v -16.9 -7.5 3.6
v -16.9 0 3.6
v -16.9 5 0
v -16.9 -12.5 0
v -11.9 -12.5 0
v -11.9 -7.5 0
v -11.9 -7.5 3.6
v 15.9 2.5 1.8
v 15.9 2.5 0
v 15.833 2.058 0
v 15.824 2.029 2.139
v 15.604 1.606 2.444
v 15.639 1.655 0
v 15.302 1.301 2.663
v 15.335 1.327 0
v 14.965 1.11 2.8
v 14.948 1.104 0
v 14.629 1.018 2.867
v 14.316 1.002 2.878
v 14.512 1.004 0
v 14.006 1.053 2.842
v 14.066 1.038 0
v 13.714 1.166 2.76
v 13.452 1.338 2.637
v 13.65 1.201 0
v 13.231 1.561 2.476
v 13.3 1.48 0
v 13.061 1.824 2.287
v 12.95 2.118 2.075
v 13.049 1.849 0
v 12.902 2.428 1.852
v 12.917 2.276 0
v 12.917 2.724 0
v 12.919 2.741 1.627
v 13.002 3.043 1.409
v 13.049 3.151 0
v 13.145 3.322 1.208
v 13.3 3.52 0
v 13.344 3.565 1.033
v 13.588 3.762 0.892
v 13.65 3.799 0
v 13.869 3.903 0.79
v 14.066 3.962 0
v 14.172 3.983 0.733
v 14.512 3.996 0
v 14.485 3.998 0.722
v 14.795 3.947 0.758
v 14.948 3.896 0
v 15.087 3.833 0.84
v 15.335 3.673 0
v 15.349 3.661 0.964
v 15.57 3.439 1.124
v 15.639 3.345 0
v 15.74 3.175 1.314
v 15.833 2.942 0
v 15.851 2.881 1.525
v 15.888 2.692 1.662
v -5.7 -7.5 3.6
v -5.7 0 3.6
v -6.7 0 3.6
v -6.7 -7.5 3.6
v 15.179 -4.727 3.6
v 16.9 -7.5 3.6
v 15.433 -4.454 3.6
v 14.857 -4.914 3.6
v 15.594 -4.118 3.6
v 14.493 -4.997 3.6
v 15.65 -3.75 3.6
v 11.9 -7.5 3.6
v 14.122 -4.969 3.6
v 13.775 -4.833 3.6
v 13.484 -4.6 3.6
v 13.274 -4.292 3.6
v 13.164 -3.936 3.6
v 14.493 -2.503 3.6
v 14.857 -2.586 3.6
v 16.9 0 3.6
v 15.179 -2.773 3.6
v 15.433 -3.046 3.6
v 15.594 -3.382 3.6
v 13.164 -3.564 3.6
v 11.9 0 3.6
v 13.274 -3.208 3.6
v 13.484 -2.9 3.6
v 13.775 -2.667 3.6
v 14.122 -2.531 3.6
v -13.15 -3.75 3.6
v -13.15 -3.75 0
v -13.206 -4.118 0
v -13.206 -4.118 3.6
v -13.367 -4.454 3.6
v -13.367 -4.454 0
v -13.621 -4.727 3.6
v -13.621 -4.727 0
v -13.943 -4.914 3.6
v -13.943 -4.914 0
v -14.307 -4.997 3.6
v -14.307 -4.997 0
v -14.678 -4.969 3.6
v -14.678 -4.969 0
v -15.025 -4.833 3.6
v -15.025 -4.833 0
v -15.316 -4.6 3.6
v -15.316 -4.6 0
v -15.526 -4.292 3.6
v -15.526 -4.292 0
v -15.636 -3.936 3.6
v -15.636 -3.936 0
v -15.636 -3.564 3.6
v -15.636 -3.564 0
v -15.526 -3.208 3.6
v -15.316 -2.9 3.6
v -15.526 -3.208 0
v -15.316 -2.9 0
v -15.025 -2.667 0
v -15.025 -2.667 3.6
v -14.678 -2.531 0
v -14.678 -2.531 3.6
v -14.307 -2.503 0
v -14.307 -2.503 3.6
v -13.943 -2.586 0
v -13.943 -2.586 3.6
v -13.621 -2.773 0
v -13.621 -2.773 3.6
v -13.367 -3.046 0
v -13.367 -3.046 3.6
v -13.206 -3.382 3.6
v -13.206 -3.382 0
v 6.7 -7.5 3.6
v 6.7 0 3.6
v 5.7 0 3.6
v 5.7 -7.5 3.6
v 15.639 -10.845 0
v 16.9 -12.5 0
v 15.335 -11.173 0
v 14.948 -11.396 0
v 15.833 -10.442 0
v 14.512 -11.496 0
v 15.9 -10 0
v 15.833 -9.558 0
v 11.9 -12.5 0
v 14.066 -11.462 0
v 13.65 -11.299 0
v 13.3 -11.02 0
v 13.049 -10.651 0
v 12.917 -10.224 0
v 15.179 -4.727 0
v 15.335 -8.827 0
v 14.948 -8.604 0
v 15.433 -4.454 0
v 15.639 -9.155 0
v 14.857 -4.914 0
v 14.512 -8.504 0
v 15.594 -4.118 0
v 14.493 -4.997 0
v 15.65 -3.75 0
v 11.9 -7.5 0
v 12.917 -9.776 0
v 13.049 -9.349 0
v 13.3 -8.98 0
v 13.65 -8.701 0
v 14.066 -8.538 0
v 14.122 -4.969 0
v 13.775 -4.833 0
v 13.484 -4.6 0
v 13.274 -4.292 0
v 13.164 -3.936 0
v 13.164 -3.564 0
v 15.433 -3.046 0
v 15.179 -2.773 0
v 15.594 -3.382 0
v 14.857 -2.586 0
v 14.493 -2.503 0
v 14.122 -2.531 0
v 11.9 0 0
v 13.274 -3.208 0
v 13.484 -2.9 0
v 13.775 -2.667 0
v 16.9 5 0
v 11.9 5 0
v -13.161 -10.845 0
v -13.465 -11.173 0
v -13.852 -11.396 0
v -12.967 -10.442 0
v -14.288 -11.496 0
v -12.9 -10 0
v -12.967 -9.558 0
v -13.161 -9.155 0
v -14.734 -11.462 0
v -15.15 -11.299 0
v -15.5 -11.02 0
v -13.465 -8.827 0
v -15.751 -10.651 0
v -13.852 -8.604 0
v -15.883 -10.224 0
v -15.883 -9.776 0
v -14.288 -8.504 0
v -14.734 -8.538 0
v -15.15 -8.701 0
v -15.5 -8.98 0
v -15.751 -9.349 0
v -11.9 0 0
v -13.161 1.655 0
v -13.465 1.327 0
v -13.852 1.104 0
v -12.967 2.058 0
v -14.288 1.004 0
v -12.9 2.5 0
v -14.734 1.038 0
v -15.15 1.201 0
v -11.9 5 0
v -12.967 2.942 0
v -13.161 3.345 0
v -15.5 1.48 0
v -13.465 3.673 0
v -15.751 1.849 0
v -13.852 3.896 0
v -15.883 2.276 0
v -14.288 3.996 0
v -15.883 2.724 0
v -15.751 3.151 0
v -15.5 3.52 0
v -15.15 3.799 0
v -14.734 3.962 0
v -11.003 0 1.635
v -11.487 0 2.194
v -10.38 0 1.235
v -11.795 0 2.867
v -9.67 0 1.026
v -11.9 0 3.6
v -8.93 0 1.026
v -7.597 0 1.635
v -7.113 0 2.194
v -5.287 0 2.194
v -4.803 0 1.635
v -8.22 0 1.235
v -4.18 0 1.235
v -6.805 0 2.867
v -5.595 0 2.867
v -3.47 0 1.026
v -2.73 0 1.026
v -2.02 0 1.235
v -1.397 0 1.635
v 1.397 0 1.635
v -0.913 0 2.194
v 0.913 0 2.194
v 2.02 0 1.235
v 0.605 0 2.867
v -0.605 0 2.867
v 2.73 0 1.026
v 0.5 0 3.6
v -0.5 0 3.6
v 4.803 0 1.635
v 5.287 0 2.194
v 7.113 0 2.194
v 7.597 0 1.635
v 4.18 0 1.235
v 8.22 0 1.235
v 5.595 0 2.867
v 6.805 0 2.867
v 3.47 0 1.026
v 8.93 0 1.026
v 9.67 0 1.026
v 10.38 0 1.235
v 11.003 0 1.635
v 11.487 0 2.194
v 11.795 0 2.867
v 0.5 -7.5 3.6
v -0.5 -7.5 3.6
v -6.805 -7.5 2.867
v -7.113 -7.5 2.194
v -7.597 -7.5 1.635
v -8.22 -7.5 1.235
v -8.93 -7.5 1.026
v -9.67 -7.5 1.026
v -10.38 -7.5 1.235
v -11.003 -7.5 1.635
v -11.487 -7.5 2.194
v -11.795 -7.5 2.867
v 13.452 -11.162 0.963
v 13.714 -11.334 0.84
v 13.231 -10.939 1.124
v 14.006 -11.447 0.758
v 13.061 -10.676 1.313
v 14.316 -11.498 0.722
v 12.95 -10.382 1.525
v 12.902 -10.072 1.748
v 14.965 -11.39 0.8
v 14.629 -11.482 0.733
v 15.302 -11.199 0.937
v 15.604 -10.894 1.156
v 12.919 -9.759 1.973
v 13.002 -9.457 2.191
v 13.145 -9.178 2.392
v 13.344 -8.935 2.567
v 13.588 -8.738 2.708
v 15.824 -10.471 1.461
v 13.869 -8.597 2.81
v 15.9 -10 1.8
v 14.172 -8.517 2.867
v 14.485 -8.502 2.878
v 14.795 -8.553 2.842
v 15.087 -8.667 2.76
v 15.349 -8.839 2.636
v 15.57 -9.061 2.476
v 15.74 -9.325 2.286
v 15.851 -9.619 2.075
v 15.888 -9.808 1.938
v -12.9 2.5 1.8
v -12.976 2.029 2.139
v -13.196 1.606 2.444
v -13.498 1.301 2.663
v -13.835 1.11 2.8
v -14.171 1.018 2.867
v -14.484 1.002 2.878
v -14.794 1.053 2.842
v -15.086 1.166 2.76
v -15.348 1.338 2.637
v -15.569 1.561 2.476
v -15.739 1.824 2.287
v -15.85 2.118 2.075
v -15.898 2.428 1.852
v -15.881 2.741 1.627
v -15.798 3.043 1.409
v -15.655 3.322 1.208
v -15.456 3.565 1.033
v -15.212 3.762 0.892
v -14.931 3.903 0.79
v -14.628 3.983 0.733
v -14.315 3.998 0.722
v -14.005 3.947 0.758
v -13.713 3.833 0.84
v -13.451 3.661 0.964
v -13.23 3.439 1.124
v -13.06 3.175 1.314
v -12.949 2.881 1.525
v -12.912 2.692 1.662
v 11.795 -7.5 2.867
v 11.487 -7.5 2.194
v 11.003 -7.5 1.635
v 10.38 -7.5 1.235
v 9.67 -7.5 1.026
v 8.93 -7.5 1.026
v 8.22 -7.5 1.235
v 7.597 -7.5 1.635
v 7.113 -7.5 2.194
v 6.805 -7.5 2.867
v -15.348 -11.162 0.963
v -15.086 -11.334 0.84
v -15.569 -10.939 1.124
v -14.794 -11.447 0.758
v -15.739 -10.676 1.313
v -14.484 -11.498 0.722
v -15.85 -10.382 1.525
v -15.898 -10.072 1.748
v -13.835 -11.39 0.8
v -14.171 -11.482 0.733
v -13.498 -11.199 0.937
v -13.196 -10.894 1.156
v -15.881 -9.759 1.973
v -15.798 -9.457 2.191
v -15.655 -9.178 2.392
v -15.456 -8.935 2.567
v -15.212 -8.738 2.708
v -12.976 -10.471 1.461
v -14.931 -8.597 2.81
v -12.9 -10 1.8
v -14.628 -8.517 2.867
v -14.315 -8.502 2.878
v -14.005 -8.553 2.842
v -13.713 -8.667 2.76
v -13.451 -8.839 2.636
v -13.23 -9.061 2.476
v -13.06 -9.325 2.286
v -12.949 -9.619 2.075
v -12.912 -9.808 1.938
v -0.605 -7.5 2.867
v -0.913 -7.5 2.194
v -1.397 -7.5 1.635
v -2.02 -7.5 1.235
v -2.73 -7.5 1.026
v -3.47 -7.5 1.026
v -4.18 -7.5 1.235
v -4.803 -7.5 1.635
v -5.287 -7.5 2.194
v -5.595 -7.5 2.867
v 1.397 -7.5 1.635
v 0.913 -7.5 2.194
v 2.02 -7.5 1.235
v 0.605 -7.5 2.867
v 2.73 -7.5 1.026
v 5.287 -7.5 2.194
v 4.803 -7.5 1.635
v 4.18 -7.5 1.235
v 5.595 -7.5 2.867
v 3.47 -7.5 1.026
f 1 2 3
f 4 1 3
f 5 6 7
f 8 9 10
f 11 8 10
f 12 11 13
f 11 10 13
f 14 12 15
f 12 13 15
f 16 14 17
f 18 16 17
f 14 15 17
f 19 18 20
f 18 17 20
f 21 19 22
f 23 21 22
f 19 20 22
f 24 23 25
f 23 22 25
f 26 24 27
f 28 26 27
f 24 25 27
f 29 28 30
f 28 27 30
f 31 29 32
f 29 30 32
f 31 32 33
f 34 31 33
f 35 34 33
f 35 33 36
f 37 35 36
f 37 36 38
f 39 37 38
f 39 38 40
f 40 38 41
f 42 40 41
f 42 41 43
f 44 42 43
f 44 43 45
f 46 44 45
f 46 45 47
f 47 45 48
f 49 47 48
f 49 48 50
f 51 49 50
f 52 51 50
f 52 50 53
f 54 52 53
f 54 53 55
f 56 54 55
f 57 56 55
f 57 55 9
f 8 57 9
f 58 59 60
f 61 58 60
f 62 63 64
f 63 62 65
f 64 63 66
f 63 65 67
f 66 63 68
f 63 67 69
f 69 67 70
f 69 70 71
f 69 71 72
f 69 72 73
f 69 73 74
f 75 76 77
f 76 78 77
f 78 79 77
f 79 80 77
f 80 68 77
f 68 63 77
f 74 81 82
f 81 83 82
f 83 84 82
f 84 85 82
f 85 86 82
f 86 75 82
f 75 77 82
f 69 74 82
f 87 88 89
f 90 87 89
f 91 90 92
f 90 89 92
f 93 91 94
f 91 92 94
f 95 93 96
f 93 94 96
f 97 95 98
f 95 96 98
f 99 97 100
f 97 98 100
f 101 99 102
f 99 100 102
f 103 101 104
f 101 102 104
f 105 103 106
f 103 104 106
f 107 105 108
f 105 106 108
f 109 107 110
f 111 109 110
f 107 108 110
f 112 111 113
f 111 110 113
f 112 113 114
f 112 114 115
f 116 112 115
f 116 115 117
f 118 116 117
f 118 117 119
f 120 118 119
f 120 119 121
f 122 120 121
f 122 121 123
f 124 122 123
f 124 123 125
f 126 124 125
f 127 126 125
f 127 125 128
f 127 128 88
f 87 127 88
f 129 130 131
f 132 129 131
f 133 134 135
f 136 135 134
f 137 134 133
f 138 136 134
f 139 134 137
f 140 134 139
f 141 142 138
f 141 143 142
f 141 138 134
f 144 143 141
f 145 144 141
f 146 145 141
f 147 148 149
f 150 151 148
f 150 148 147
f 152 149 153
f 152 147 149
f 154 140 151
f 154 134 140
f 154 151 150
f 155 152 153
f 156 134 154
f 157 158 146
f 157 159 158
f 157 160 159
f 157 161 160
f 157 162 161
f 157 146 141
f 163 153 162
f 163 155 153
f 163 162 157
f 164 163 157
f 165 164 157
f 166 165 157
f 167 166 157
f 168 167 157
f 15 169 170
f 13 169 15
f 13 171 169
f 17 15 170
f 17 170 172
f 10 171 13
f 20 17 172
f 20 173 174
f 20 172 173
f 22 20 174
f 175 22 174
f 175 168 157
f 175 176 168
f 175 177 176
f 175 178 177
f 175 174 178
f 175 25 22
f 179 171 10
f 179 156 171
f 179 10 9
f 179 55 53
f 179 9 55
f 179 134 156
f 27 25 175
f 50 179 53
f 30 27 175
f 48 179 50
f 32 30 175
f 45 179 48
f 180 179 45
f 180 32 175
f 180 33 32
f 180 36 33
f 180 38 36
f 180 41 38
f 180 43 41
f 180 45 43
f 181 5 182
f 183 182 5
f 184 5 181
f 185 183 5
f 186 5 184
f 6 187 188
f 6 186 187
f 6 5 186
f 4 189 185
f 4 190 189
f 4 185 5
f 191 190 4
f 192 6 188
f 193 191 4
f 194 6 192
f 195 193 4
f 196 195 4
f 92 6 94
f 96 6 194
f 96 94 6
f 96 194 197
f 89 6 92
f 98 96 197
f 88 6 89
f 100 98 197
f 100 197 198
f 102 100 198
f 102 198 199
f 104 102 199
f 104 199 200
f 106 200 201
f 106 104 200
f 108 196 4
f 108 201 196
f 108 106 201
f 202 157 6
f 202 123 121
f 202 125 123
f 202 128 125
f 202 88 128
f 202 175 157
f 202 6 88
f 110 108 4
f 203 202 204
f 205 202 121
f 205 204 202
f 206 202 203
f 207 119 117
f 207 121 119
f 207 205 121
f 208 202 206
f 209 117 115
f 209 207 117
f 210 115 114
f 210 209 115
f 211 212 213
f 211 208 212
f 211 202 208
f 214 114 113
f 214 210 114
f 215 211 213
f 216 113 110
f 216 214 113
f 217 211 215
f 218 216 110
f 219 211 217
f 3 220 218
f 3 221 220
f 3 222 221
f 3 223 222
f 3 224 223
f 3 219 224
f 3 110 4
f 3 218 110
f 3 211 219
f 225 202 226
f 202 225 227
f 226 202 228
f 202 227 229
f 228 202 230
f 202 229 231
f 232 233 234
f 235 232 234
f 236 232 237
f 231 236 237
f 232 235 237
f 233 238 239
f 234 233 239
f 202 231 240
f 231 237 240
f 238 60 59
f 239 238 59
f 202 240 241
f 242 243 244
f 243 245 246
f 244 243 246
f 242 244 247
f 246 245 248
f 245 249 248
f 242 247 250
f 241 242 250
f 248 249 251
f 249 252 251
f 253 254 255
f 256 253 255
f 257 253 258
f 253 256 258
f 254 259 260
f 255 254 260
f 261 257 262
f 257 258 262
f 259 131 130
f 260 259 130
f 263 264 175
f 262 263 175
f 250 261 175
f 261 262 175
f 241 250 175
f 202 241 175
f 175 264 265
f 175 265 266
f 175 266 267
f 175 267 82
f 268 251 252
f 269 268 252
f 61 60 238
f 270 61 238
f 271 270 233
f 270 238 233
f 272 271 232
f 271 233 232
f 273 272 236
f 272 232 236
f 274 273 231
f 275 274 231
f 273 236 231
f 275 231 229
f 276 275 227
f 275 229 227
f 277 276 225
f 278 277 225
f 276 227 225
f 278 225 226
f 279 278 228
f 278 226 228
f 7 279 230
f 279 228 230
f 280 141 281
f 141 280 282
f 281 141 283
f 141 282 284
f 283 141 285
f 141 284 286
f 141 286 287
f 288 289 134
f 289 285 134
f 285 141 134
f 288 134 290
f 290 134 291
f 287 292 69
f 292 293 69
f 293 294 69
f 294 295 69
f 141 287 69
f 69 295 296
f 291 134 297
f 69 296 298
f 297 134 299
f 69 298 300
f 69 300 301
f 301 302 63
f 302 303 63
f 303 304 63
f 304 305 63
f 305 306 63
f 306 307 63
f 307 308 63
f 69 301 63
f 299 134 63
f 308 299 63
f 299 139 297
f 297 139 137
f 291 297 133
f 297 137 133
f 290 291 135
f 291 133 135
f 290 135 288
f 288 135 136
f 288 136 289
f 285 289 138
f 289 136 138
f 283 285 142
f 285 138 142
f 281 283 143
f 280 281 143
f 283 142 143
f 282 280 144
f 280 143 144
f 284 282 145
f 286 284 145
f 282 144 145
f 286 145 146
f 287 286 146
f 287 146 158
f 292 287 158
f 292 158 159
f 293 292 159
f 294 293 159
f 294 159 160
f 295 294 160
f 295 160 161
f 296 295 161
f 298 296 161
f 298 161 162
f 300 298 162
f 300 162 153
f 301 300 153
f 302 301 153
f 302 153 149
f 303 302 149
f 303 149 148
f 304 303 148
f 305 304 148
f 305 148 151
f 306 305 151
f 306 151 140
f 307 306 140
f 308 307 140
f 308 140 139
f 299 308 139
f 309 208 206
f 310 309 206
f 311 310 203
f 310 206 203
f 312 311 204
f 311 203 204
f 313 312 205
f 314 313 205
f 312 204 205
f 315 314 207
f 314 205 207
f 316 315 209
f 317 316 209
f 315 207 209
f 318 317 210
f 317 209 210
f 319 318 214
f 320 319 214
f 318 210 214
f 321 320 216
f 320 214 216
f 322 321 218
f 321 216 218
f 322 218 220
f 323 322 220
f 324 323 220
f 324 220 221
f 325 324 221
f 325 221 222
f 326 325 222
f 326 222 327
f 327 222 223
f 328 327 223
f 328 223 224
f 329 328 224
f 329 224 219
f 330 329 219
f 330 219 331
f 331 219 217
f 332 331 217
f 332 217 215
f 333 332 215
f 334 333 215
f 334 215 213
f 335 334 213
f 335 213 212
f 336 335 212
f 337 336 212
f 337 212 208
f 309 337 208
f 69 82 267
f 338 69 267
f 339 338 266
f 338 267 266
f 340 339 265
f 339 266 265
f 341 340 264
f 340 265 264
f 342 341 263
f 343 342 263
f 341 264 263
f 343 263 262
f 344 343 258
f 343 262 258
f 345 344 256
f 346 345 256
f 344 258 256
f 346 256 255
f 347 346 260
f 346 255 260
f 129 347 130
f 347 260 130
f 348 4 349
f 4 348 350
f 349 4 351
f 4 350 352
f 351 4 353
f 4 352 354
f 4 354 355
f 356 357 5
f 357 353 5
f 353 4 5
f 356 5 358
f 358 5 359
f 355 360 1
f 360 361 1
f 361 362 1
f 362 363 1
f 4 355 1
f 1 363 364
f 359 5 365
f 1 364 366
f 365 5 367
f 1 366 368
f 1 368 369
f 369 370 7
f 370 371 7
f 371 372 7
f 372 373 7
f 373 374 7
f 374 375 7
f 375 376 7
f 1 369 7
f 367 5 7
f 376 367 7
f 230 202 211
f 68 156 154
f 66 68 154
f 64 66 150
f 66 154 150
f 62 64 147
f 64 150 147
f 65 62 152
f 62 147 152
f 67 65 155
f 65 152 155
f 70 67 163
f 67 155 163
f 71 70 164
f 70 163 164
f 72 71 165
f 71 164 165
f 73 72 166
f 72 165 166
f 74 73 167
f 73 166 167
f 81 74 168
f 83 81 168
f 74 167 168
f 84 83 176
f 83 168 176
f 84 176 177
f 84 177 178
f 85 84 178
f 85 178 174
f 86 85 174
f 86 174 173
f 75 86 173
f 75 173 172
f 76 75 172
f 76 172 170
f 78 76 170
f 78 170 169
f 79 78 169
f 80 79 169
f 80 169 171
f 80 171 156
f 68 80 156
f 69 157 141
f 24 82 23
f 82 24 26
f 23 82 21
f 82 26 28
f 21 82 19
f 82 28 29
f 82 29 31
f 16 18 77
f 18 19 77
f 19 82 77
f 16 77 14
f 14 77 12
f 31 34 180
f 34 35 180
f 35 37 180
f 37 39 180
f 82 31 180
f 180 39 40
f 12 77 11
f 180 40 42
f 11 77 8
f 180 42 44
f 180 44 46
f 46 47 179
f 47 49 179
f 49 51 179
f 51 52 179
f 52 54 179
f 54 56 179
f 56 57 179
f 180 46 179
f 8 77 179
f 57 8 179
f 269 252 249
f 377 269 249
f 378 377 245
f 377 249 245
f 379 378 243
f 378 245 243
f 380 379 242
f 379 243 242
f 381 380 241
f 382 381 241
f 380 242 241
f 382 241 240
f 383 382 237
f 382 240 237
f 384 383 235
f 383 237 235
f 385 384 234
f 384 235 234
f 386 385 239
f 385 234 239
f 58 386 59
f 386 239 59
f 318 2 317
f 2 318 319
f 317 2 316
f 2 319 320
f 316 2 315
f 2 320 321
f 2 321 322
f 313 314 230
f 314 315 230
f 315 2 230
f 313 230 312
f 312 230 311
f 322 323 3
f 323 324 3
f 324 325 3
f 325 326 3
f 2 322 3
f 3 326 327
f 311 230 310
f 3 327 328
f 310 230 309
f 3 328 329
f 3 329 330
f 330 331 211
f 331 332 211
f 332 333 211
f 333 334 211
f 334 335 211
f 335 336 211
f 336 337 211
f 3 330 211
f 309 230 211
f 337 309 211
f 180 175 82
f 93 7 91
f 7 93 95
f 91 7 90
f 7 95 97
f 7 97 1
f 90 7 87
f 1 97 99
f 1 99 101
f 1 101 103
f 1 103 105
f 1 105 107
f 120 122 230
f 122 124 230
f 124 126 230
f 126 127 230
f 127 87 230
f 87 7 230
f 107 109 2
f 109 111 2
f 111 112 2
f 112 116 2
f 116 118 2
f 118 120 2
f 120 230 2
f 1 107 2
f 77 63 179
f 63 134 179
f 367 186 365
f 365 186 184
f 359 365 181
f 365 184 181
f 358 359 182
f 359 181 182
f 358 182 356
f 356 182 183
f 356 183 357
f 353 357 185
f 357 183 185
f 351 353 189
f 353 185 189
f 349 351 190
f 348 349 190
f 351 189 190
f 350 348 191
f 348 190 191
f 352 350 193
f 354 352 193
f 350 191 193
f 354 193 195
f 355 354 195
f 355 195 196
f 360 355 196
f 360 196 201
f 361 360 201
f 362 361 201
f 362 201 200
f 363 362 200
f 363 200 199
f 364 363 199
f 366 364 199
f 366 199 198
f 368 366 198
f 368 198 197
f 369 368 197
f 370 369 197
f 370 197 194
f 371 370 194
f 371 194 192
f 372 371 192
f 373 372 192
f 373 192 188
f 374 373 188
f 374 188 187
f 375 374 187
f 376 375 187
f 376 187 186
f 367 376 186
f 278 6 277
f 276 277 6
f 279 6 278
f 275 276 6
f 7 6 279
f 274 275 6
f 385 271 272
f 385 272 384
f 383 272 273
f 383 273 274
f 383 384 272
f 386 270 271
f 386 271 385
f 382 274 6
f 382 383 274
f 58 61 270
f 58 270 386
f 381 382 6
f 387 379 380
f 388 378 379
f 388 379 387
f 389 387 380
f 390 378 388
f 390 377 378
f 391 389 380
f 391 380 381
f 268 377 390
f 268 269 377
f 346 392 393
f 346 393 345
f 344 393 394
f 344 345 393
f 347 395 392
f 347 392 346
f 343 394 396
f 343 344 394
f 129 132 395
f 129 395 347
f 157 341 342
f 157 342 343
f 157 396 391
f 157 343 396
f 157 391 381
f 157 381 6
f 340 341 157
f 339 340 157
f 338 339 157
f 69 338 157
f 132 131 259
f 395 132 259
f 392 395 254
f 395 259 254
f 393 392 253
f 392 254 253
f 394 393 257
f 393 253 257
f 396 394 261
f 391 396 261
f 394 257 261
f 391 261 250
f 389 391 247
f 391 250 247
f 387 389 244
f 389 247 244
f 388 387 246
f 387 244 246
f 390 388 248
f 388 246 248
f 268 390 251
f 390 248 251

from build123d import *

# Parameters (mm, degrees)
F1_DEPTH      = 7.5
F2_W          = 5
F2_H          = 3.6
F3_DEPTH      = 5
F3_DEPTH_BACK = 12.5
F5_DEPTH      = 35.2
F6_R          = 1.5
F6_R_2        = 1.25
F7_DEPTH      = 25


with BuildPart() as f1:
    # F0 (on Front) → F1 (new body)
    with BuildSketch(Plane.XZ):
        with BuildLine():
            Line((16.9, 3.6), (11.9, 3.6))
            ThreePointArc((11.9, 3.6), (9.3, 1), (6.7, 3.6))
            Line((6.7, 3.6), (5.7, 3.6))
            ThreePointArc((5.7, 3.6), (3.1, 1), (0.5, 3.6))
            Line((0.5, 3.6), (-0.5, 3.6))
            ThreePointArc((-0.5, 3.6), (-3.1, 1), (-5.7, 3.6))
            Line((-5.7, 3.6), (-6.7, 3.6))
            ThreePointArc((-6.7, 3.6), (-9.3, 1), (-11.9, 3.6))
            Line((-11.9, 3.6), (-16.9, 3.6))
            Line((-16.9, 3.6), (-16.9, 0))
            Line((-16.9, 0), (16.9, 0))
            Line((16.9, 0), (16.9, 3.6))
        make_face()
    extrude(amount=F1_DEPTH)

    # F2 (on face) → F3 (join, two sides)
    with BuildSketch(Plane(origin=(0, 0, 0), x_dir=(-1, 0, 0), z_dir=(0, 1, 0))) as f3_sk:
        with Locations((-14.4, 1.8)):
            Rectangle(F2_W, F2_H)
        with Locations((14.4, 1.8)):
            Rectangle(F2_W, F2_H)
    extrude(amount=F3_DEPTH)
    extrude(f3_sk.sketch, amount=-F3_DEPTH_BACK)

    # F4 (on face) → F5 (cut)
    with BuildSketch(Plane.YZ.offset(16.9)):
        Polygon((-7.5, 3.6), (-12.5, 3.6), (-12.5, 0), align=None)
        Polygon((5, 0), (5, 3.6), (0, 3.6), align=None)
    extrude(amount=-F5_DEPTH, mode=Mode.SUBTRACT)

    # F6 (on face) → F7 (cut)
    with BuildSketch(Plane(origin=(0, 0, 0), x_dir=(1, 0, 0), z_dir=(0, 0, -1))):
        with Locations((14.4, 10)):
            Circle(F6_R)
        with Locations((14.4, 3.75)):
            Circle(F6_R_2)
        with Locations((14.4, -2.5)):
            Circle(F6_R)
        with Locations((-14.4, -2.5)):
            Circle(F6_R)
        with Locations((-14.4, 10)):
            Circle(F6_R)
        with Locations((-14.4, 3.75)):
            Circle(F6_R_2)
    extrude(amount=-F7_DEPTH, mode=Mode.SUBTRACT)


solid = f1.part
